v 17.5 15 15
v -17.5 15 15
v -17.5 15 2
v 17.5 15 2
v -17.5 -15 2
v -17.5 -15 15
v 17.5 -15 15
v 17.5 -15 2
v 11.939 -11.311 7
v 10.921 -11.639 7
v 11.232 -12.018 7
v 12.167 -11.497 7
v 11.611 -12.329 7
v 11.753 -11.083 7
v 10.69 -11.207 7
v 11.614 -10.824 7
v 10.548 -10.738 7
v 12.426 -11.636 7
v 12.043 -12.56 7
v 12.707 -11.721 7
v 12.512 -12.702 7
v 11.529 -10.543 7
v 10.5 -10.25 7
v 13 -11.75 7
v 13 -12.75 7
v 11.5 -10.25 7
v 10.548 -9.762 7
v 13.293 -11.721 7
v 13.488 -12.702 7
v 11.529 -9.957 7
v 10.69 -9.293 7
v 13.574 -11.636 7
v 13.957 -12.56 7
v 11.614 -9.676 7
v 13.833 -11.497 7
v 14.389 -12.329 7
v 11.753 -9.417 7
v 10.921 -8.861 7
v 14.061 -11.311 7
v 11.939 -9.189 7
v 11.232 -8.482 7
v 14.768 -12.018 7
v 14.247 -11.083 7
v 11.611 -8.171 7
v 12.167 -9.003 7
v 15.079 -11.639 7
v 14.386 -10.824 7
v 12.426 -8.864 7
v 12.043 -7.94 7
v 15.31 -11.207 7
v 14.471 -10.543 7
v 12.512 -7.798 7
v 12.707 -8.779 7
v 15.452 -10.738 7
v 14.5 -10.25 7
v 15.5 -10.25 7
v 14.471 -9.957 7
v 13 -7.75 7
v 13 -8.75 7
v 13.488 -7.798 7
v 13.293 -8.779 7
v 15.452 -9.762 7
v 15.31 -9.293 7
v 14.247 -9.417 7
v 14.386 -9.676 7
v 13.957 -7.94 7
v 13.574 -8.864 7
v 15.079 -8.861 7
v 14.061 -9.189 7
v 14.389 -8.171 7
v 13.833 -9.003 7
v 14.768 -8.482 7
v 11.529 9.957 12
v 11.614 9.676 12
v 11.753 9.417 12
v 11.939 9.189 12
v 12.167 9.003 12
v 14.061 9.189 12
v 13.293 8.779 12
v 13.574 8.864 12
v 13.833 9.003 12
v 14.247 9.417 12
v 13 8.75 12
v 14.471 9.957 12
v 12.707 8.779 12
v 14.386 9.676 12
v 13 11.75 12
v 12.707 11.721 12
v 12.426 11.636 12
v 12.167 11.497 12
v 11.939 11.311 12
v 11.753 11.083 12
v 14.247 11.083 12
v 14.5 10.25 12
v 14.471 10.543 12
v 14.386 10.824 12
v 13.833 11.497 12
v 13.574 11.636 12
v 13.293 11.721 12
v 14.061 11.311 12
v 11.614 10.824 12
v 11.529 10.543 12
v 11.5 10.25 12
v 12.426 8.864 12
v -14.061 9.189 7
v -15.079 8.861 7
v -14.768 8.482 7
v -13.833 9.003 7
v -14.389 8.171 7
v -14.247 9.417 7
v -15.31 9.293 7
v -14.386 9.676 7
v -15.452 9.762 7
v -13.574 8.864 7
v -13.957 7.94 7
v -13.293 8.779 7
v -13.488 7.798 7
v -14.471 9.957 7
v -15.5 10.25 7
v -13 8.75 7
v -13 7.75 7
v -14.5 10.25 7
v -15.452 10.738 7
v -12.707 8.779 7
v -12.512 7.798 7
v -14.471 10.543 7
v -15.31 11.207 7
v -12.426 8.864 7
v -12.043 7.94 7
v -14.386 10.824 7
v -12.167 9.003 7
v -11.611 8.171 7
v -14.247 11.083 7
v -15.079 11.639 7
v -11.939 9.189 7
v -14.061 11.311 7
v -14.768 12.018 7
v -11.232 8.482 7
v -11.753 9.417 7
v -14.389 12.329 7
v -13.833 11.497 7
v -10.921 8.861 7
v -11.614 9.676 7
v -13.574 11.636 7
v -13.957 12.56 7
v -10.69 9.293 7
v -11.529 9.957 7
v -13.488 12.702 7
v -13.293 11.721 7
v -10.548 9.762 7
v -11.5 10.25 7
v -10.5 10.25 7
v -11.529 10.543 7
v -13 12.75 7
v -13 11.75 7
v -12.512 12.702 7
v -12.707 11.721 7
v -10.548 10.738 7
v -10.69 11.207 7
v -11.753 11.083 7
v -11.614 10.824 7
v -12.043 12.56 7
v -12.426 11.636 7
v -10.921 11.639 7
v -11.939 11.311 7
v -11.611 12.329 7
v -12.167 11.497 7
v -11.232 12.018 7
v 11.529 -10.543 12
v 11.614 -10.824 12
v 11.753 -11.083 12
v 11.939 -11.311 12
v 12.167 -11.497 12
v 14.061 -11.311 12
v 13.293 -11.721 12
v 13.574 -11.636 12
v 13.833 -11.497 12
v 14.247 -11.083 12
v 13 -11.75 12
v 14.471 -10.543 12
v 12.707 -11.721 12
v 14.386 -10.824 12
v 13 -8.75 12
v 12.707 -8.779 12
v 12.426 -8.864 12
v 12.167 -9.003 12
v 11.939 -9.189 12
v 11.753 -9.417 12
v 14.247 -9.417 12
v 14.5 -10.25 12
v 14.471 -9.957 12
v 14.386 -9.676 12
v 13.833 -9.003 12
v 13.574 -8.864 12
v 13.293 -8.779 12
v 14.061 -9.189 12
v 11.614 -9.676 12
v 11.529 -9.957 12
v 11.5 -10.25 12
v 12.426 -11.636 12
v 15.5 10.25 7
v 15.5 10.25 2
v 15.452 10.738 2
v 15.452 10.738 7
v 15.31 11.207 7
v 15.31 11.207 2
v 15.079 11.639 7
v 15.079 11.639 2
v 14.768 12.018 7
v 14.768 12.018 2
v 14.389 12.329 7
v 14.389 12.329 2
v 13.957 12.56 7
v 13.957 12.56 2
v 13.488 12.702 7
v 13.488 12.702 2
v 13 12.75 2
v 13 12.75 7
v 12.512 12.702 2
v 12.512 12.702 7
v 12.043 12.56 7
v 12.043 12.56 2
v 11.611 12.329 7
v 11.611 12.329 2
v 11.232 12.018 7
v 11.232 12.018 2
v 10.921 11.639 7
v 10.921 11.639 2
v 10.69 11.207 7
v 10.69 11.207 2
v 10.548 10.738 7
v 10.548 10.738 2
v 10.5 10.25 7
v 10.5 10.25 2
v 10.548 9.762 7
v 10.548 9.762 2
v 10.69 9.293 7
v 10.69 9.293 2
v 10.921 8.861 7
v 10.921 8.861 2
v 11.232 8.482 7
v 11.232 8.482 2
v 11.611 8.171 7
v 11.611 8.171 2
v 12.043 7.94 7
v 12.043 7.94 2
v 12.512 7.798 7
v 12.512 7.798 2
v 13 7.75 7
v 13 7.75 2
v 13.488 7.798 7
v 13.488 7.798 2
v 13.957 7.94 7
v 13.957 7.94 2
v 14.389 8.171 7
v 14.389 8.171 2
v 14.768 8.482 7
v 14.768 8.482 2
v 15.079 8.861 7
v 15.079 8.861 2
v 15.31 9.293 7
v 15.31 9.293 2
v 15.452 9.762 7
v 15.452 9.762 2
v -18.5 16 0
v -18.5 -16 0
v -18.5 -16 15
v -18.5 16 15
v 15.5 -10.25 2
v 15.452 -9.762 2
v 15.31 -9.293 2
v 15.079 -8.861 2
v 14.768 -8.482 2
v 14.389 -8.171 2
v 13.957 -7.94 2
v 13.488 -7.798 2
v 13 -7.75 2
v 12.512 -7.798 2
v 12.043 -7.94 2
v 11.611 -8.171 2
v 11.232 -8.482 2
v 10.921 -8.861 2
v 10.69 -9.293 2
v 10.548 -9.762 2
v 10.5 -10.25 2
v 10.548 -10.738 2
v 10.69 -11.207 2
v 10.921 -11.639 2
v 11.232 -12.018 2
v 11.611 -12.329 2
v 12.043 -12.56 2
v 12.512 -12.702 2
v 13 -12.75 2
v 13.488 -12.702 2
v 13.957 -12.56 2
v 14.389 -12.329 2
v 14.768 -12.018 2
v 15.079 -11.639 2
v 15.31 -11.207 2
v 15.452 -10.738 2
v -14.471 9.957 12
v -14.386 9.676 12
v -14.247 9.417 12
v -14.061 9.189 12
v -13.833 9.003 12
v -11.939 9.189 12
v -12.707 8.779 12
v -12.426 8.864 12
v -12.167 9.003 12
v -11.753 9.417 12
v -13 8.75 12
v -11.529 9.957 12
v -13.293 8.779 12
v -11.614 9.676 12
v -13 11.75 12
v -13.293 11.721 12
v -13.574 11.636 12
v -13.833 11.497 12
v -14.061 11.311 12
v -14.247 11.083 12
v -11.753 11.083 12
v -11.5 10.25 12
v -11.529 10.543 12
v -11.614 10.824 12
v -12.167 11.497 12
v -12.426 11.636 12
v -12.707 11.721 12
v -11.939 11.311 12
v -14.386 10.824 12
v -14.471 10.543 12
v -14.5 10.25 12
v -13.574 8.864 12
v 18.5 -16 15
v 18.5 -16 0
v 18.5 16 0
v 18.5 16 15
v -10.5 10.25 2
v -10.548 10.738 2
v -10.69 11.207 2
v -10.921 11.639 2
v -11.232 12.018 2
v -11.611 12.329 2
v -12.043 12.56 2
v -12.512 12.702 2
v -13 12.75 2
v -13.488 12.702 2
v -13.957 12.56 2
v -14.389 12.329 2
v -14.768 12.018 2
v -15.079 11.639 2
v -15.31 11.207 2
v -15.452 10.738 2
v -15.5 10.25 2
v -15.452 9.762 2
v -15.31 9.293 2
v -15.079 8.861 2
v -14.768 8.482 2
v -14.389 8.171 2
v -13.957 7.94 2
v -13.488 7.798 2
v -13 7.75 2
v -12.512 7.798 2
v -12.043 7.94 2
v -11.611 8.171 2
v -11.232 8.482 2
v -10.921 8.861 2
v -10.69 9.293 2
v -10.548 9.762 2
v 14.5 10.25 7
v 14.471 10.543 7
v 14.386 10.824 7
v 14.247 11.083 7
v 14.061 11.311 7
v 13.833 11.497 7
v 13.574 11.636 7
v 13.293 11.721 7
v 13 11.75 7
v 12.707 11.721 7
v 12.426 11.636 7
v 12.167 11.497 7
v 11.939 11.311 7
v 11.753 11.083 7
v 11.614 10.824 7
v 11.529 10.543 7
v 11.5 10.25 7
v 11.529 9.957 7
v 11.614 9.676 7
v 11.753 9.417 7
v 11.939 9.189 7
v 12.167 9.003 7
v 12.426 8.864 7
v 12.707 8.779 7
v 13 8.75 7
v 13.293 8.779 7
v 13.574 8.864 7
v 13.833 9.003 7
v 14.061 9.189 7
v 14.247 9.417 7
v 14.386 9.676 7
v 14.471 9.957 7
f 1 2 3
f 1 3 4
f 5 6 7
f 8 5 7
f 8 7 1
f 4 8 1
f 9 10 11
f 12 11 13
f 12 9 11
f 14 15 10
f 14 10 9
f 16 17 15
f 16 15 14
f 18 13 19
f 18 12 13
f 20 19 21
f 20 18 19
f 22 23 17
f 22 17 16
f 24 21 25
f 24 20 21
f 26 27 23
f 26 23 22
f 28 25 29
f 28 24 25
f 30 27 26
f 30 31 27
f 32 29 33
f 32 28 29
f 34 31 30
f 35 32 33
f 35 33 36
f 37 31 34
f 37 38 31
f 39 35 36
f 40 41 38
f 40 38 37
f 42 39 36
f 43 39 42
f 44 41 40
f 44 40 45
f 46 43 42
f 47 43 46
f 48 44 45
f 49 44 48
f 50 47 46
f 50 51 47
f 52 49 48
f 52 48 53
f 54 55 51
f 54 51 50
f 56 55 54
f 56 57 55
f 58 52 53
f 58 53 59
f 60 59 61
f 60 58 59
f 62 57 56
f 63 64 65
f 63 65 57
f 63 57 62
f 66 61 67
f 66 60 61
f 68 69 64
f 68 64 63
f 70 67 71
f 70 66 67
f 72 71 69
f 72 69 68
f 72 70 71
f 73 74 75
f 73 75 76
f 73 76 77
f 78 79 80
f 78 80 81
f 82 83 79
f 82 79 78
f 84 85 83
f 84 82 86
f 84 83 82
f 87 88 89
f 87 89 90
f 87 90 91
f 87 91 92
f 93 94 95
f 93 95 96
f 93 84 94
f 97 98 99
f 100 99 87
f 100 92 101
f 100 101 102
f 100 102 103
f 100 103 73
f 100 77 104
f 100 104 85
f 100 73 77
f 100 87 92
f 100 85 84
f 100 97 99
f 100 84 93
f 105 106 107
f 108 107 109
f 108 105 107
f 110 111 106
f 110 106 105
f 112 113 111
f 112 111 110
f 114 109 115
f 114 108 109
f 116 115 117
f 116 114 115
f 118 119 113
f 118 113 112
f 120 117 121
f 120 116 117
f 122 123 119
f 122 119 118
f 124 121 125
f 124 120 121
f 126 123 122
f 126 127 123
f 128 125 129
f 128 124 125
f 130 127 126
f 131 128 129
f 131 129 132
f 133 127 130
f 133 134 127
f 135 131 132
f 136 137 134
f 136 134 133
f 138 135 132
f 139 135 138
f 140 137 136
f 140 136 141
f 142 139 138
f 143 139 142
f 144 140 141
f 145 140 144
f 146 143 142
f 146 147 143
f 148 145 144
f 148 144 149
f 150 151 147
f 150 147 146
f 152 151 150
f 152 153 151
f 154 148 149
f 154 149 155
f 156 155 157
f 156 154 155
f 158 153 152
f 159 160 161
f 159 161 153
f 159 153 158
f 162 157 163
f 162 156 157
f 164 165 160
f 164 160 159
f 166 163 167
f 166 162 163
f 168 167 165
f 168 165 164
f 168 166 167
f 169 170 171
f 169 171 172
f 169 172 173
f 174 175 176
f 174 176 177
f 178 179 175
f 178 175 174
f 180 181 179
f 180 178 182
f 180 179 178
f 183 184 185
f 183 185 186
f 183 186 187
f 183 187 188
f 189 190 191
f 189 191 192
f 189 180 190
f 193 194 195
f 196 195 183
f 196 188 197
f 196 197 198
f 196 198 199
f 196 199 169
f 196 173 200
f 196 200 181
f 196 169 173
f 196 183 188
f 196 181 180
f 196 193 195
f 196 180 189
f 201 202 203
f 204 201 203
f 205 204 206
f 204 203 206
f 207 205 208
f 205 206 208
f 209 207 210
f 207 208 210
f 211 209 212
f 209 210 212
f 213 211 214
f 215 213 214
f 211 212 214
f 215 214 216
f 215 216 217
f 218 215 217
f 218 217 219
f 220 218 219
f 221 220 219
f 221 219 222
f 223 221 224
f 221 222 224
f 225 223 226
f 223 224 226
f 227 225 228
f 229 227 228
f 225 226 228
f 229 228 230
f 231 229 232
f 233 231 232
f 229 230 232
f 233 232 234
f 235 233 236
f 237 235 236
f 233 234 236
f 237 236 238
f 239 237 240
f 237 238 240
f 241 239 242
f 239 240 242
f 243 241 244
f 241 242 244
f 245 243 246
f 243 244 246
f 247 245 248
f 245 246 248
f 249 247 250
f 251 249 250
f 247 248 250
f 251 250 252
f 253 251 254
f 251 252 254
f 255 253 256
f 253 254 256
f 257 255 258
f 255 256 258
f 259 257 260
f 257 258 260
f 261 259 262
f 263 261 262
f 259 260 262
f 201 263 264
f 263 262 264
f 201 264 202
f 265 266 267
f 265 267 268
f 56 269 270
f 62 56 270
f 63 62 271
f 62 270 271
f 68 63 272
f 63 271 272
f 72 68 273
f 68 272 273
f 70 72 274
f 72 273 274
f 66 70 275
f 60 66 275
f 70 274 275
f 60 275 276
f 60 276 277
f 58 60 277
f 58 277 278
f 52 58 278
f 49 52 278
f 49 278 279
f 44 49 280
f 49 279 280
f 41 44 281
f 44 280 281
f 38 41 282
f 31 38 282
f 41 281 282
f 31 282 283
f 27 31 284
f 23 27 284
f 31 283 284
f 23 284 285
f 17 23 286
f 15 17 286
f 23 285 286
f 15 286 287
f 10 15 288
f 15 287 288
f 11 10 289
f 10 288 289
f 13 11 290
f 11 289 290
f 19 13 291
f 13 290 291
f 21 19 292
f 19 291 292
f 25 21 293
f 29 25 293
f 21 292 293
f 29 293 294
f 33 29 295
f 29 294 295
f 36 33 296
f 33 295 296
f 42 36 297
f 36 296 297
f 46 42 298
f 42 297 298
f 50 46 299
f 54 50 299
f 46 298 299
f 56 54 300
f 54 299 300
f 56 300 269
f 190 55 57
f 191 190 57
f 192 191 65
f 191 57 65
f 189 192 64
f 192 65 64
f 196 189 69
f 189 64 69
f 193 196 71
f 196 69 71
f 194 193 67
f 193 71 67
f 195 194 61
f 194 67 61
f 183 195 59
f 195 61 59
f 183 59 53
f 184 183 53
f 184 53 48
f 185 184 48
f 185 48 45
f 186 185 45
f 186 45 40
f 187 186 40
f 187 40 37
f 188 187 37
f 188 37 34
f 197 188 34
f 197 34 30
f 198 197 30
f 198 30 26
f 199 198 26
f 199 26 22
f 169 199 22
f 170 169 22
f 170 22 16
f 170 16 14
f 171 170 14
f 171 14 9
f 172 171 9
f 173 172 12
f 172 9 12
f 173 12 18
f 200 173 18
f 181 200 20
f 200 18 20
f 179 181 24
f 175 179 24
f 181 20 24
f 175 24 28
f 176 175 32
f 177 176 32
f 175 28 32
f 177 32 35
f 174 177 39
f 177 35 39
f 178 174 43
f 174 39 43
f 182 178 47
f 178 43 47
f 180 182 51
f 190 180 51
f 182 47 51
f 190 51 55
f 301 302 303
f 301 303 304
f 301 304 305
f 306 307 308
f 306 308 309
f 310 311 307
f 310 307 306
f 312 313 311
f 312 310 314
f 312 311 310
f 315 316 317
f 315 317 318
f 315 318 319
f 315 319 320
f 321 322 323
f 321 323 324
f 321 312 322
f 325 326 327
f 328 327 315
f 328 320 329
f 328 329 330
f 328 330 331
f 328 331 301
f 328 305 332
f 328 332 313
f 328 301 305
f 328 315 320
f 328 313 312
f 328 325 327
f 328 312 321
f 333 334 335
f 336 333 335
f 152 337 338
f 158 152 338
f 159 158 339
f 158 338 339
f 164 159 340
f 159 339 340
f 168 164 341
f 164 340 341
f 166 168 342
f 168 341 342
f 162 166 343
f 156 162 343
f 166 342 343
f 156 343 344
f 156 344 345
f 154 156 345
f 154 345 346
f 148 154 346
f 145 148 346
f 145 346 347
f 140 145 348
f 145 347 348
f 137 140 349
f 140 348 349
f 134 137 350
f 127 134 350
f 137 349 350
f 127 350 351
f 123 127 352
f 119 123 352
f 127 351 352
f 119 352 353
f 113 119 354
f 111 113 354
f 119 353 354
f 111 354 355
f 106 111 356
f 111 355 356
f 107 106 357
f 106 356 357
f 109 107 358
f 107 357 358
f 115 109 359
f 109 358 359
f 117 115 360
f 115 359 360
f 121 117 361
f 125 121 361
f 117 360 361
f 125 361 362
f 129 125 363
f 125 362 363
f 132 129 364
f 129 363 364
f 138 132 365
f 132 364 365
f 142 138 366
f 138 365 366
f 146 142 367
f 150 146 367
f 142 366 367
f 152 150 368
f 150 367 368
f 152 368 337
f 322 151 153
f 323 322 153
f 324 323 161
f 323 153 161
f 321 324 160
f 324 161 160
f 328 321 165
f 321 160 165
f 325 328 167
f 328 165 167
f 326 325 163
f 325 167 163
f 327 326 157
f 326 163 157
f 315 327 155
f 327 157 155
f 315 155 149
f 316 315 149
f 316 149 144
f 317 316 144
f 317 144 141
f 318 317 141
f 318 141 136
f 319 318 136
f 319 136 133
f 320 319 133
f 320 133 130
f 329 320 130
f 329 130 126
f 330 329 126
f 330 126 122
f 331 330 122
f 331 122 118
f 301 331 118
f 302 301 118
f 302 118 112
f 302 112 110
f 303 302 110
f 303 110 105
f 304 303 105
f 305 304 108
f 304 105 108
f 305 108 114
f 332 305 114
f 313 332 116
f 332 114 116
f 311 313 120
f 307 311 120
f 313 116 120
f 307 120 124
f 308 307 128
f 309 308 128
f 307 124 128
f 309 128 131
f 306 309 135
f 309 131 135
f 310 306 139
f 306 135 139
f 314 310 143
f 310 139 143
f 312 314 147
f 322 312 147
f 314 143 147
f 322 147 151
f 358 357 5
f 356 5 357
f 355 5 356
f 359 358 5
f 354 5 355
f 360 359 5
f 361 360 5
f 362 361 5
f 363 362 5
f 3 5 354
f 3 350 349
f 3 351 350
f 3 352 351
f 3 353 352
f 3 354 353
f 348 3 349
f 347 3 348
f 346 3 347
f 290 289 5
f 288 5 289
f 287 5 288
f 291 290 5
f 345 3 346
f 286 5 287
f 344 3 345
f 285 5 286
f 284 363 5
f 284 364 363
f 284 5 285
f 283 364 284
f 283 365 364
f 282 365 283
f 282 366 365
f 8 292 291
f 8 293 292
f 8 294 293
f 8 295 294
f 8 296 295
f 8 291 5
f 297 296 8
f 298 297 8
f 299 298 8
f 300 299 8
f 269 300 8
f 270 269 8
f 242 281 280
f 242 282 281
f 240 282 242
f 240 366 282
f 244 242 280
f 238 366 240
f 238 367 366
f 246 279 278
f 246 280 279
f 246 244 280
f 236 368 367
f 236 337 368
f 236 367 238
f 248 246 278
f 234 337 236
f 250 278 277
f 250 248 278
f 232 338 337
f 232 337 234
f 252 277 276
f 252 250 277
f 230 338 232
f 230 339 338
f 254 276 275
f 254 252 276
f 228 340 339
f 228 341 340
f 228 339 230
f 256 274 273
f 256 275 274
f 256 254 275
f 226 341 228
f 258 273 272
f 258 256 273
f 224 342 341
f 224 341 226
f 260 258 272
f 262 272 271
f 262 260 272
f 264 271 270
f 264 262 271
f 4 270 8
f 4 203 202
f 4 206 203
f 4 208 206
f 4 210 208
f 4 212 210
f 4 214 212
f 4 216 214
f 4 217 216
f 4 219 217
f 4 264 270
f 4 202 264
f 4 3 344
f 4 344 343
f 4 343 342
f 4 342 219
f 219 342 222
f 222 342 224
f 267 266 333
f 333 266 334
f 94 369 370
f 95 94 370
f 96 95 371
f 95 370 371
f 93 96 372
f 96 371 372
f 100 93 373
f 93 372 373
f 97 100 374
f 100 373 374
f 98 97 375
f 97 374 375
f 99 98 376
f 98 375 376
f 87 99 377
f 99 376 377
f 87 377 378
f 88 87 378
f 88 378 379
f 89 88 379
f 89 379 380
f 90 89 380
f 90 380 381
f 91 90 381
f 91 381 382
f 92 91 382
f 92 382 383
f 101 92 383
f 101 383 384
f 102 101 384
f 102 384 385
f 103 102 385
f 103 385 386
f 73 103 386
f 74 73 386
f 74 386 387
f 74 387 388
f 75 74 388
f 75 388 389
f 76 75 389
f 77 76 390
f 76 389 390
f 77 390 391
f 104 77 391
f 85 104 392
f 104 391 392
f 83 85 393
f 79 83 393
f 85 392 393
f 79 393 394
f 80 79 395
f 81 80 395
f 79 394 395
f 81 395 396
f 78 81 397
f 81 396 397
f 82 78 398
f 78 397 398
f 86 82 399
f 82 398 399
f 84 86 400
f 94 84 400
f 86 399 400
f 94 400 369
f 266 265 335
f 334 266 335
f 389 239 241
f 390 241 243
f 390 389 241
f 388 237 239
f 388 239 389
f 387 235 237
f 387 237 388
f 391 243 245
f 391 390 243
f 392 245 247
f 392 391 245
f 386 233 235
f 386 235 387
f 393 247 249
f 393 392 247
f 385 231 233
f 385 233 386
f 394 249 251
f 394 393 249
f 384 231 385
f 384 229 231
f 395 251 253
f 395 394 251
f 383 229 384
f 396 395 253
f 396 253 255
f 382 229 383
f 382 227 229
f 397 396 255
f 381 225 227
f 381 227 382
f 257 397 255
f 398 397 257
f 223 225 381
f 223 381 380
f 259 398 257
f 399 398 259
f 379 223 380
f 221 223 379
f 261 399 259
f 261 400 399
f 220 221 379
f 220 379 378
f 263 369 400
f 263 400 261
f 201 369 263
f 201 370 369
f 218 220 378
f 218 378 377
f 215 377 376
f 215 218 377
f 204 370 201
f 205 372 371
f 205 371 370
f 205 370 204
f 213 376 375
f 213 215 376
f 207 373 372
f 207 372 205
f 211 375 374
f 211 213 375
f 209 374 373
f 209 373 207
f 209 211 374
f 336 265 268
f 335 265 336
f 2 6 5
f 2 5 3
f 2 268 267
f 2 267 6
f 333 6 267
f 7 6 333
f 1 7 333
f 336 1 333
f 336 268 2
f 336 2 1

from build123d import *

# Parameters (mm, degrees)
F1_W     = 37
F1_H     = 32
F2_DEPTH = 15
F3_W     = 35
F3_H     = 30
F4_DEPTH = 13
F5_R     = 2.5
F5_R_2   = 1.5
F6_DEPTH = 5
F7_DEPTH = 10


with BuildPart() as f2:
    # F1 (on Top) → F2 (new body)
    with BuildSketch(Plane.XY):
        Rectangle(F1_W, F1_H)
    extrude(amount=F2_DEPTH)

    # F3 (on face) → F4 (cut)
    with BuildSketch(Plane.XY.offset(15)):
        Rectangle(F3_W, F3_H)
    extrude(amount=-F4_DEPTH, mode=Mode.SUBTRACT)

    # F5 (on face) → F6 (join)
    with BuildSketch(Plane.XY.offset(2)):
        with Locations((-13, 10.25)):
            Circle(F5_R)
        with Locations((-13, 10.25)):
            Circle(F5_R_2, mode=Mode.SUBTRACT)
        with Locations((13, 10.25)):
            Circle(F5_R)
        with Locations((13, 10.25)):
            Circle(F5_R_2, mode=Mode.SUBTRACT)
        with Locations((13, -10.25)):
            Circle(F5_R)
        with Locations((13, -10.25)):
            Circle(F5_R_2, mode=Mode.SUBTRACT)
        with Locations((-13, 10.25)):
            Circle(F5_R_2)
        with Locations((13, 10.25)):
            Circle(F5_R_2)
        with Locations((13, -10.25)):
            Circle(F5_R_2)
    extrude(amount=F6_DEPTH)

    # F5 (on face) → F7 (join)
    with BuildSketch(Plane.XY.offset(2)):
        with Locations((-13, 10.25)):
            Circle(F5_R_2)
        with Locations((13, 10.25)):
            Circle(F5_R_2)
        with Locations((13, -10.25)):
            Circle(F5_R_2)
    extrude(amount=F7_DEPTH)


solid = f2.part
